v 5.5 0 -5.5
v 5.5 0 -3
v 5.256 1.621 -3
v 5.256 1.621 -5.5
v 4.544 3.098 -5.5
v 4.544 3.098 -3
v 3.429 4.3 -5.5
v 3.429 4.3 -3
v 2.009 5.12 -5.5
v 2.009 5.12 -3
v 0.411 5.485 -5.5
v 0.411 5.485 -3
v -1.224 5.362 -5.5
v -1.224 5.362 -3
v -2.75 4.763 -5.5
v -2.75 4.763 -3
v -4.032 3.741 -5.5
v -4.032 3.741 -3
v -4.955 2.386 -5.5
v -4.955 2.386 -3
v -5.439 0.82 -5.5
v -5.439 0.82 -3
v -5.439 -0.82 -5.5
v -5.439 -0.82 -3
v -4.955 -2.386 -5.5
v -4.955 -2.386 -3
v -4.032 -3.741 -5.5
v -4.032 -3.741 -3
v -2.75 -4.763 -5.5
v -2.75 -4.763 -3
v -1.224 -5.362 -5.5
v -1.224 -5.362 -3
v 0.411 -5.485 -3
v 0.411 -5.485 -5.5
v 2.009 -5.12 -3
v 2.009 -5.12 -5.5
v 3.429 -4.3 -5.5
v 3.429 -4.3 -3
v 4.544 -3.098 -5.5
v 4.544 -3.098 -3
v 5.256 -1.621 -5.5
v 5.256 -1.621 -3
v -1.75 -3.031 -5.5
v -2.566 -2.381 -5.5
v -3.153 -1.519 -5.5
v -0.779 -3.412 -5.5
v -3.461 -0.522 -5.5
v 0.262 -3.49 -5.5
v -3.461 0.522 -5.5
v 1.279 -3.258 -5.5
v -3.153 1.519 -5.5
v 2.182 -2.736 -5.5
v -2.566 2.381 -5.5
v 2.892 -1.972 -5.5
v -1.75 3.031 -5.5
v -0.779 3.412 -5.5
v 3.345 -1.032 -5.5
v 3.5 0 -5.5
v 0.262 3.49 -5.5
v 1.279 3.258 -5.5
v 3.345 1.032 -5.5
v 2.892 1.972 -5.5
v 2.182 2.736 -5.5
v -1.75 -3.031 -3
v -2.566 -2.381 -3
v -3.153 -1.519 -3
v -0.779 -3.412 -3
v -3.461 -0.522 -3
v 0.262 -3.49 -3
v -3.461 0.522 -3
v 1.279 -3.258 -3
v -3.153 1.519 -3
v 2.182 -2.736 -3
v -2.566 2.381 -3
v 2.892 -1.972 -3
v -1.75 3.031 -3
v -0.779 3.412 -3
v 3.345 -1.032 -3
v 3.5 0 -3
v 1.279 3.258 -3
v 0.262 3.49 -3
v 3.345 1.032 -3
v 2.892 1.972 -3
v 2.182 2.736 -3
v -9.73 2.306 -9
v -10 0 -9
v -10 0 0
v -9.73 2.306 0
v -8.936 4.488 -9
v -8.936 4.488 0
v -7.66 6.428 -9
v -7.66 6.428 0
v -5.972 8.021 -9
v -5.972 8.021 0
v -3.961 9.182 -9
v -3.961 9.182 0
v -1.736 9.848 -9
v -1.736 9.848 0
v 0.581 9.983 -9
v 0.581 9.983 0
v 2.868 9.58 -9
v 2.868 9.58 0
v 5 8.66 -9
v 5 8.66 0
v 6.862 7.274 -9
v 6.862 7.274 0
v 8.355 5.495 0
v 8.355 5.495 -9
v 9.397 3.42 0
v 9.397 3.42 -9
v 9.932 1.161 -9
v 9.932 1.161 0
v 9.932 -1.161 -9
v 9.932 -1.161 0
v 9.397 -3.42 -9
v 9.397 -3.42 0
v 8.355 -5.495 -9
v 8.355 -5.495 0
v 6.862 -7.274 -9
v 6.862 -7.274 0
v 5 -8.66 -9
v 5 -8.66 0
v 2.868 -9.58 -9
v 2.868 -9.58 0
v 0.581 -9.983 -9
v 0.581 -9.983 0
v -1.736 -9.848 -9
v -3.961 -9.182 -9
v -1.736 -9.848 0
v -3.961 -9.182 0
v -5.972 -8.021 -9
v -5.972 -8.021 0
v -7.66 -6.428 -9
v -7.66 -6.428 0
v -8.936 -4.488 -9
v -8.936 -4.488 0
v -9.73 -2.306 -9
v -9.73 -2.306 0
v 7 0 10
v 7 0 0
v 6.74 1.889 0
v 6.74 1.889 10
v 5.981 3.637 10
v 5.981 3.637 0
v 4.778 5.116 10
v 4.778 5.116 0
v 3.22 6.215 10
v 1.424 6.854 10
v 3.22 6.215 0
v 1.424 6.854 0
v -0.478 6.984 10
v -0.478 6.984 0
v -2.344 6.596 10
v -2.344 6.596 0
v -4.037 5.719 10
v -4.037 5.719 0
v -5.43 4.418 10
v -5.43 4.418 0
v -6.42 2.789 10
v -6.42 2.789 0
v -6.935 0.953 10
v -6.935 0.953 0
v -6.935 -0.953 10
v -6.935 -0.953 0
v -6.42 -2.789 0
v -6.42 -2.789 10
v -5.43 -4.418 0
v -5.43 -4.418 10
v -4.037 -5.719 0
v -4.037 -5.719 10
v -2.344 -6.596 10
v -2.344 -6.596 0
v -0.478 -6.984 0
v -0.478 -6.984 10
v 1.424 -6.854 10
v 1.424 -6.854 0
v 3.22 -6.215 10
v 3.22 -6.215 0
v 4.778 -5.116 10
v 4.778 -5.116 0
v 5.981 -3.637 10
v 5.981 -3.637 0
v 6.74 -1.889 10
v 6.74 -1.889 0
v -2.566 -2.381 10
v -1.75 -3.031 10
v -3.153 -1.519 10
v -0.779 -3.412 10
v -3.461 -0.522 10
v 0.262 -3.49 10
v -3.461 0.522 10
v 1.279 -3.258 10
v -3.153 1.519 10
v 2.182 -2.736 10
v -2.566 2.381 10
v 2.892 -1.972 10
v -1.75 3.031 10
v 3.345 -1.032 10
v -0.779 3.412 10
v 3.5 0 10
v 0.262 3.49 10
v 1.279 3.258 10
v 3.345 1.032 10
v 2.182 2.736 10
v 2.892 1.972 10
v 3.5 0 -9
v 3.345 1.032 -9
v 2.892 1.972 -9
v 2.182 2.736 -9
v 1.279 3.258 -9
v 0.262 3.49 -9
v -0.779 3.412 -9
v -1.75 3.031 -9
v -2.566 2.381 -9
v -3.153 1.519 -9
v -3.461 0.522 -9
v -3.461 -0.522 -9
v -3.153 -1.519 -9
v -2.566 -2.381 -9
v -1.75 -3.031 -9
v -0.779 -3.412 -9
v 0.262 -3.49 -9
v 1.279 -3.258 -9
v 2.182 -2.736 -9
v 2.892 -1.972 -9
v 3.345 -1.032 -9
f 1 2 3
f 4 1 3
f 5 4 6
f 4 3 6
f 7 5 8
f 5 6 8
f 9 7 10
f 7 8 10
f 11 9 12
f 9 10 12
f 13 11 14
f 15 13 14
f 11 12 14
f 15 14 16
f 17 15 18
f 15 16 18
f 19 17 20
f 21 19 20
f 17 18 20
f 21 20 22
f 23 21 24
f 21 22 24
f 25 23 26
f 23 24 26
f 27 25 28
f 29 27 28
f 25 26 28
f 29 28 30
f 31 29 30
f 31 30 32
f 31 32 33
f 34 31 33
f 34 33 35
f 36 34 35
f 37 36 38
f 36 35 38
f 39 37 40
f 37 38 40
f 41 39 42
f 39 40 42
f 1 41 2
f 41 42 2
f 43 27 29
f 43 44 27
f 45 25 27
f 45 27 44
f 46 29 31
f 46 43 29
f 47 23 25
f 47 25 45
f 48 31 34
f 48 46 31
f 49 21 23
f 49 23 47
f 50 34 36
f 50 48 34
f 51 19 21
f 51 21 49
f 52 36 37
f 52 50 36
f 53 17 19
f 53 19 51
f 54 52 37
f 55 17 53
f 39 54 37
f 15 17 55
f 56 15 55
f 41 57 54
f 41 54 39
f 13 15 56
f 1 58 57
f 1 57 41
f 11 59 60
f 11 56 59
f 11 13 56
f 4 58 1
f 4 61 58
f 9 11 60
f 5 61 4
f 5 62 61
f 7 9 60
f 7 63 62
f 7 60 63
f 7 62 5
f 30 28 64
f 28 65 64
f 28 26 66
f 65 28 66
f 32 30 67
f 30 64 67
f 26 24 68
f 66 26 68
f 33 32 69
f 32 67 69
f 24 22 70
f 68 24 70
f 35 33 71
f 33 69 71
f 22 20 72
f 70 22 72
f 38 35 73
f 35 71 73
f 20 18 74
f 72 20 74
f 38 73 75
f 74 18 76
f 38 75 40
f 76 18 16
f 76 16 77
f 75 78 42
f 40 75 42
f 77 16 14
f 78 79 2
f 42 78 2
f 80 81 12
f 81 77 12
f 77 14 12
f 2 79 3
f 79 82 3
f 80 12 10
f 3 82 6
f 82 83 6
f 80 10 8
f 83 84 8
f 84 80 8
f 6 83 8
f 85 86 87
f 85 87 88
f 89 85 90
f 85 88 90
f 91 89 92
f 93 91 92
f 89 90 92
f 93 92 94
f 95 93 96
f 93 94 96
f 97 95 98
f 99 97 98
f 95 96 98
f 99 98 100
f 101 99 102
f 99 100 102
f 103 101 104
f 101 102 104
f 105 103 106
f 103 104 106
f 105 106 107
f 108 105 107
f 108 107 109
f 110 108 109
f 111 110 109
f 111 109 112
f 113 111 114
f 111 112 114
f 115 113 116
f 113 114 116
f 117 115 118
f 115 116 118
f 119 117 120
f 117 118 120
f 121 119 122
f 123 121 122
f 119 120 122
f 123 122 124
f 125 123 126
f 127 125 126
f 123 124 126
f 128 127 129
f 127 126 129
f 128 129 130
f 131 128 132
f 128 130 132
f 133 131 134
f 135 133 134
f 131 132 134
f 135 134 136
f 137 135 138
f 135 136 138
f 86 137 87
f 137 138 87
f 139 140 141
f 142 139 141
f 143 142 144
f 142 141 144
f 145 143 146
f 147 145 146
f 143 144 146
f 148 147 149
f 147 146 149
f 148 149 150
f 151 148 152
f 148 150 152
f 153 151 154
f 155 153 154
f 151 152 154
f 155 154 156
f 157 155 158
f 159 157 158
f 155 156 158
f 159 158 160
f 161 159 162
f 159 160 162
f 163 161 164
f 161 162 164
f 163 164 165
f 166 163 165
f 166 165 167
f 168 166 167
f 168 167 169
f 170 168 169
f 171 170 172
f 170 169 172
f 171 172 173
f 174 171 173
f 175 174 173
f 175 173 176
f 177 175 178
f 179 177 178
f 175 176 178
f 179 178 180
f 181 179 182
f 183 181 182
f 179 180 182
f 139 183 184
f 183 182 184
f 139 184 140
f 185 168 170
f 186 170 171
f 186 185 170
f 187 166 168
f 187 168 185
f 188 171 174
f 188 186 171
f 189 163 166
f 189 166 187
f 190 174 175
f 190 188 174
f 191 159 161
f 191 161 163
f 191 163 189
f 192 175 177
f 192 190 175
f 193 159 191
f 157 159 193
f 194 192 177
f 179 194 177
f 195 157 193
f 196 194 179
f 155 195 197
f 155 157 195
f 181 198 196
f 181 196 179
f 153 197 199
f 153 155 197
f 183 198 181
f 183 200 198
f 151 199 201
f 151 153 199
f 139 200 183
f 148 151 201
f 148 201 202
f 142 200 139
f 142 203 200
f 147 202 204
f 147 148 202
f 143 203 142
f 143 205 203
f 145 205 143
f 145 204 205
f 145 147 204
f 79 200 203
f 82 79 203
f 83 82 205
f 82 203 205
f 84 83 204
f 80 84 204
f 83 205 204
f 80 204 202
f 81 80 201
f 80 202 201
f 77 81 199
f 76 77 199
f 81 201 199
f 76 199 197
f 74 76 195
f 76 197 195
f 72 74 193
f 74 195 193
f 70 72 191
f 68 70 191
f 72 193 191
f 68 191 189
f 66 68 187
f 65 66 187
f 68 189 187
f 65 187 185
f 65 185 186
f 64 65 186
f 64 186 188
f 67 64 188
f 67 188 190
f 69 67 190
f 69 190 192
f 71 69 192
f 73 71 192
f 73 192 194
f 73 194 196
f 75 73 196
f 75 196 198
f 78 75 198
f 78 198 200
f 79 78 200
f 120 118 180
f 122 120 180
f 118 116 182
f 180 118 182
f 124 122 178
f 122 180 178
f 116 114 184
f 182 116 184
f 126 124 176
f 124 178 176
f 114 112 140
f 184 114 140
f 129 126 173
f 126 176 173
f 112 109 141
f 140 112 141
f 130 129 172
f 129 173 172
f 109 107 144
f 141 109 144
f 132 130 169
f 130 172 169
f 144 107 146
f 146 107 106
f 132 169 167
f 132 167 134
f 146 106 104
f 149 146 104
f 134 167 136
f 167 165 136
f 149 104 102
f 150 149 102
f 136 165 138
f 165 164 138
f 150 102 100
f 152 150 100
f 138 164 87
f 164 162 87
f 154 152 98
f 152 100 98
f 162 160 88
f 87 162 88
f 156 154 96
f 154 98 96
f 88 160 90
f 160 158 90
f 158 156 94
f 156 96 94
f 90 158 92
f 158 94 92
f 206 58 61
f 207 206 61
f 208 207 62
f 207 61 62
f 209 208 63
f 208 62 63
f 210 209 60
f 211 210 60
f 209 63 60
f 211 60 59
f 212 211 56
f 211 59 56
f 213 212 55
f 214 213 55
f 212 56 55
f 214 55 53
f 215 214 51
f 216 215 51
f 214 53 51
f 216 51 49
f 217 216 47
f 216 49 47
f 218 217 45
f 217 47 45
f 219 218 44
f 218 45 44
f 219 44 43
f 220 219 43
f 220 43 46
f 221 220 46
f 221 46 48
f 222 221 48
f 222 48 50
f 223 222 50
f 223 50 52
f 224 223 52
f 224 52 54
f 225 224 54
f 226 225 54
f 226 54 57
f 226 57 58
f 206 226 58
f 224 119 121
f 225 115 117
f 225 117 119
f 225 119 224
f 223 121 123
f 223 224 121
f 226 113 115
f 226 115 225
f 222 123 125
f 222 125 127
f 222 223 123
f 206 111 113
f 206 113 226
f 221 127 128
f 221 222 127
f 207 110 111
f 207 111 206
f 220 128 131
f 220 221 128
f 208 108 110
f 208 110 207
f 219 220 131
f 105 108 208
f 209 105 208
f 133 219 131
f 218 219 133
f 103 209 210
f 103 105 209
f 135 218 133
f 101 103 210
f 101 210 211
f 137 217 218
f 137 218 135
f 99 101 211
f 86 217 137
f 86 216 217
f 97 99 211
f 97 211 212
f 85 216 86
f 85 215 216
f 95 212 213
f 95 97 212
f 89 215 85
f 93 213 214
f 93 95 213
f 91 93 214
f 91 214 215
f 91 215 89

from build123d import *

# Parameters (mm, degrees)
SKETCH_2_R          = 7
EXTRUDE_1_DEPTH     = 10
SKETCH_3_R          = 10
EXTRUDE_2_DEPTH     = 9
SKETCH_4_R          = 3.5
CUT_EXTRUDE_1_DEPTH = 20
CUT_EXTRUDE_START   = -13
SKETCH_5_R          = 5.5
CUT_EXTRUDE_2_DEPTH = 2.5


with BuildPart() as part:
    # Эскиз2 → Бобышка-Вытянуть1 (new body)
    with BuildSketch(Plane.XY):
        Circle(SKETCH_2_R)
    extrude(amount=EXTRUDE_1_DEPTH)

    # Эскиз3 → Бобышка-Вытянуть2 (add)
    with BuildSketch(Plane(origin=(0, 0, 0), x_dir=(-1, 0, 0), z_dir=(0, 0, -1))):
        Circle(SKETCH_3_R)
    extrude(amount=EXTRUDE_2_DEPTH)

    # Эскиз4 → Вырез-Вытянуть1 (cut, through all)
    with BuildSketch(Plane.XY.offset(10)):
        Circle(SKETCH_4_R)
    extrude(amount=-CUT_EXTRUDE_1_DEPTH, mode=Mode.SUBTRACT)

    # Эскиз5 → Вырез-Вытянуть2 (cut)
    with BuildSketch(Plane.XY.offset(10).offset(CUT_EXTRUDE_START)):
        Circle(SKETCH_5_R)
    extrude(amount=-CUT_EXTRUDE_2_DEPTH, mode=Mode.SUBTRACT)


solid = part.part
